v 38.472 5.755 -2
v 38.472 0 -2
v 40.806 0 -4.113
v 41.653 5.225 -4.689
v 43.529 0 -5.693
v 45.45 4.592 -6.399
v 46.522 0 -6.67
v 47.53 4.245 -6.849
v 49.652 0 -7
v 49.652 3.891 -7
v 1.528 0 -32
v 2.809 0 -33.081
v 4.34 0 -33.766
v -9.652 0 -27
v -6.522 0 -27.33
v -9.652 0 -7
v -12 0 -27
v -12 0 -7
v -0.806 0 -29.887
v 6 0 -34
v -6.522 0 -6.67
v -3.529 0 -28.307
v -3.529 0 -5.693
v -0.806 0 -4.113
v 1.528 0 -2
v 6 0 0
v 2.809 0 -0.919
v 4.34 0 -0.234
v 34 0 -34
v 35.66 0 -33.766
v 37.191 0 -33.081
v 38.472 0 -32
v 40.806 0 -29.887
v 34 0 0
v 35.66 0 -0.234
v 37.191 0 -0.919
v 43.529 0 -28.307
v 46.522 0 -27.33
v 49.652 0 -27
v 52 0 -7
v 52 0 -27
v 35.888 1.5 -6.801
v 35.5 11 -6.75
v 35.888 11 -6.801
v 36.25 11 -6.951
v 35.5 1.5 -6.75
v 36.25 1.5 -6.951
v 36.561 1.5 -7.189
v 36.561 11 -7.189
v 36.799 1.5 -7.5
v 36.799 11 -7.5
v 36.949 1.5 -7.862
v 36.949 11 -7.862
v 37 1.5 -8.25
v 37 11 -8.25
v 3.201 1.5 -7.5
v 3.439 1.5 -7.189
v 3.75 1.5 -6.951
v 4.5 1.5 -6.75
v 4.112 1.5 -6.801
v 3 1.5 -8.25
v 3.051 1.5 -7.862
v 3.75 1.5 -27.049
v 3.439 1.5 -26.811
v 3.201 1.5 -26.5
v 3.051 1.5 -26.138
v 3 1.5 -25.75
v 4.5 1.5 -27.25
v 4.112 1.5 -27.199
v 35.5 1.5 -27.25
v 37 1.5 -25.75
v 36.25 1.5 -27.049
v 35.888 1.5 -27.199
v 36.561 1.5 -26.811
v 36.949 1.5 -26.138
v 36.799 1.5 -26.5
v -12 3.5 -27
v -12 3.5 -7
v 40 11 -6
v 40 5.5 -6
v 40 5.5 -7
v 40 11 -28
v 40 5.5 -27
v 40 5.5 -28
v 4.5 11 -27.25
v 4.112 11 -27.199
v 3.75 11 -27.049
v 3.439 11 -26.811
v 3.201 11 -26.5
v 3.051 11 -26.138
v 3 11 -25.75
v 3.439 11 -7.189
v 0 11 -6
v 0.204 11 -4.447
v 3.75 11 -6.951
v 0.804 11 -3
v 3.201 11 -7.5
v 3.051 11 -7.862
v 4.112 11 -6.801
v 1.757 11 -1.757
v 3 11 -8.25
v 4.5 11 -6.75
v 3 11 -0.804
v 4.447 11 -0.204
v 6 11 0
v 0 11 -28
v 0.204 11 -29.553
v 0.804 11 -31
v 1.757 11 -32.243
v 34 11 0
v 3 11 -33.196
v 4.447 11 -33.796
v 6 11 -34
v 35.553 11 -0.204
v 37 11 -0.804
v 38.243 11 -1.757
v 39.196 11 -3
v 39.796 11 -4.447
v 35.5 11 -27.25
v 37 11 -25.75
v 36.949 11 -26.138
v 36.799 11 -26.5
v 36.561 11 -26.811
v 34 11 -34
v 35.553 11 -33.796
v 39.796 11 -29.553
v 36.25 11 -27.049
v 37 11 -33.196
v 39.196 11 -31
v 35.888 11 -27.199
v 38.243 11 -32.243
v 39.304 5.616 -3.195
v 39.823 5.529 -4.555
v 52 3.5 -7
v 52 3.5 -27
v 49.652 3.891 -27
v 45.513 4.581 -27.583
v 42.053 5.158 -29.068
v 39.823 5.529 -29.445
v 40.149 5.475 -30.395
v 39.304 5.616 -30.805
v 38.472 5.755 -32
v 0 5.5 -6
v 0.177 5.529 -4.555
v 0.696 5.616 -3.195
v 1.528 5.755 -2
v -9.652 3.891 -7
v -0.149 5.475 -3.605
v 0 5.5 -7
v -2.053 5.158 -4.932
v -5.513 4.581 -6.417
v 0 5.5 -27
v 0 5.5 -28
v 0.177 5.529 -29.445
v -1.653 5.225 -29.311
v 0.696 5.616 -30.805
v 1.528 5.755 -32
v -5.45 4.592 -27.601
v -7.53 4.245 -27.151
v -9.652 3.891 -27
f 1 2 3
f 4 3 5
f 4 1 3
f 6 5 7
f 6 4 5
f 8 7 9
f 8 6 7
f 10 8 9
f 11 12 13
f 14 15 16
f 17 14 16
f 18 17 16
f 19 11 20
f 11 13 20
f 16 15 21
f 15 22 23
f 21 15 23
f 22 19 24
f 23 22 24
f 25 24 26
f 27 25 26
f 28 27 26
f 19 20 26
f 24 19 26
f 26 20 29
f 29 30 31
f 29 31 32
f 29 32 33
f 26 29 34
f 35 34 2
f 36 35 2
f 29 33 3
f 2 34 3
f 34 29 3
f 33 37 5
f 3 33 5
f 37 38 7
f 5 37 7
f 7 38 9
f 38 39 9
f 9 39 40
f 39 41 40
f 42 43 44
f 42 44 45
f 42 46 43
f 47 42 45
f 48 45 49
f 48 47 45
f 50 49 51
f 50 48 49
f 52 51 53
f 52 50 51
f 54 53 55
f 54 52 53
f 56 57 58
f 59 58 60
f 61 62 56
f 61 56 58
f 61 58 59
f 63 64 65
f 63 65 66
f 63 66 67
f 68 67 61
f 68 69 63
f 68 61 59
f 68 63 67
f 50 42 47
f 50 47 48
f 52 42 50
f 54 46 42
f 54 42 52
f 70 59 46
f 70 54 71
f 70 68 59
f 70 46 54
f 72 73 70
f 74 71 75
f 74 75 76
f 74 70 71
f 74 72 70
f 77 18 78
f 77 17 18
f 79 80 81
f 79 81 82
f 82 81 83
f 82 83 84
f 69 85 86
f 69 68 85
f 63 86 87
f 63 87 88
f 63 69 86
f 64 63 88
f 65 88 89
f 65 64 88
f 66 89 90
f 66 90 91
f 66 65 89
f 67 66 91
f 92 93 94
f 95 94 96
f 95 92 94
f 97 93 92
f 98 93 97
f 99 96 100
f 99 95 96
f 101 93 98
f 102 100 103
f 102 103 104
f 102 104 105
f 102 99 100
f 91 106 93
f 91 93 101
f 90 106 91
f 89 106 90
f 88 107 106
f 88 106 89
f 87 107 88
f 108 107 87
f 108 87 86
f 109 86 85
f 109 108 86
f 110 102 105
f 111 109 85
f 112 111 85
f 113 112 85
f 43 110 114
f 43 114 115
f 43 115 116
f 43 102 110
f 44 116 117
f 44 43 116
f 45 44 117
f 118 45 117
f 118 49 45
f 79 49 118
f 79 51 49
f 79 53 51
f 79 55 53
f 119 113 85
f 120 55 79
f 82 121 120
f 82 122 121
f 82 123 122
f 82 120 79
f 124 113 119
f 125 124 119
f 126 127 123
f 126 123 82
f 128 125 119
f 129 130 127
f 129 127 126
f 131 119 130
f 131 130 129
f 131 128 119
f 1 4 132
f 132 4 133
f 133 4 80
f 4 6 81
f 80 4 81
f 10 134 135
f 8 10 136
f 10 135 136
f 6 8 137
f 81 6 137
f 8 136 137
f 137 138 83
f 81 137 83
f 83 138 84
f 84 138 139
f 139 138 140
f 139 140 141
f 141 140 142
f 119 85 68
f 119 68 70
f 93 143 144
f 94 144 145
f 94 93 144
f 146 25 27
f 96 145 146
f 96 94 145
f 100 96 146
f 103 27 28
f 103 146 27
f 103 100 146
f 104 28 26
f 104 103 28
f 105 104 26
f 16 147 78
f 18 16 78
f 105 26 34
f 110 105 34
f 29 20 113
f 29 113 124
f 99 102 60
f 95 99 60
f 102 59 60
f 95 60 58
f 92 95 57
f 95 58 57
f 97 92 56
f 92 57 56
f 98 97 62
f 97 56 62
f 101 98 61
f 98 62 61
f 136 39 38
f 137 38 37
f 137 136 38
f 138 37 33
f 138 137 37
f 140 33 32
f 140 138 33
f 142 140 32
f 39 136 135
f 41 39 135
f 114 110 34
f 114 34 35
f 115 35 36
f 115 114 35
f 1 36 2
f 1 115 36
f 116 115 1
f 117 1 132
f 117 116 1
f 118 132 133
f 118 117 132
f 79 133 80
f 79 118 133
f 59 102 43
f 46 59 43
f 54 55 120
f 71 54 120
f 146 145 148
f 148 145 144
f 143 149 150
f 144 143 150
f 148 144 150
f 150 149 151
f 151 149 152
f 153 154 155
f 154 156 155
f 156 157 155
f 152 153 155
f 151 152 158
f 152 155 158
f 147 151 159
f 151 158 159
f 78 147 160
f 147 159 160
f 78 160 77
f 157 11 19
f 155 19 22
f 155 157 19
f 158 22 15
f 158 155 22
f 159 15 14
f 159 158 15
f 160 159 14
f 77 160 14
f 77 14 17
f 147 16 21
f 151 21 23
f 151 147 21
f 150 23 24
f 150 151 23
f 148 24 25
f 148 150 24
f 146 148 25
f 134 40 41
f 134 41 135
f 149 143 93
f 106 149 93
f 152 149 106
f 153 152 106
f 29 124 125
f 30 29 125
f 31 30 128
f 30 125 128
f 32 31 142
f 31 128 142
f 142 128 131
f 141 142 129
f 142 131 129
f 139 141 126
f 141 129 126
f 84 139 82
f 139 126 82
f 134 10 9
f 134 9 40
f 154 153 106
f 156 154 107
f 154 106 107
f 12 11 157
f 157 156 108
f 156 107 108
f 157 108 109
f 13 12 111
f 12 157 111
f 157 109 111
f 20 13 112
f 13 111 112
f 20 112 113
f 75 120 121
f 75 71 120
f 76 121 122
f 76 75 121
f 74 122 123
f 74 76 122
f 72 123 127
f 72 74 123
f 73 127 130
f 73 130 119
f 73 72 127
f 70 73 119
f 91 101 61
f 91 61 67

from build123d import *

# Parameters (mm, degrees)
SKETCH1_W           = 40
SKETCH1_H           = 34
BOSS_EXTRUDE1_DEPTH = 11
SKETCH3_W           = 34
SKETCH3_H           = 20.5
CUT_EXTRUDE1_DEPTH  = 9.5
FILLET2_R           = 1.5
BOSS_EXTRUDE3_DEPTH = 10
FILLET3_R           = 6
FILLET4_R           = 15


with BuildPart() as part:
    # Sketch1 → Boss-Extrude1 (new body)
    with BuildSketch(Plane(origin=(0, 0, 0), x_dir=(1, 0, 0), z_dir=(0, 1, 0))):
        with Locations((20, 17)):
            Rectangle(SKETCH1_W, SKETCH1_H)
    extrude(amount=BOSS_EXTRUDE1_DEPTH)

    # Sketch3 → Cut-Extrude1 (cut)
    with BuildSketch(Plane(origin=(0, 11, 0), x_dir=(1, 0, 0), z_dir=(0, 1, 0))):
        with Locations((20, 17)):
            Rectangle(SKETCH3_W, SKETCH3_H)
    extrude(amount=-CUT_EXTRUDE1_DEPTH, mode=Mode.SUBTRACT)

    # Fillet2
    fillet2_edges = [part.edges().sort_by_distance(p)[0] for p in [
        (3, 6.25, -27.25),
        (3, 6.25, -6.75),
        (37, 6.25, -6.75),
        (37, 6.25, -27.25),
    ]]
    fillet(fillet2_edges, radius=FILLET2_R)

    # Sketch5 → Boss-Extrude3 (add, symmetric)
    with BuildSketch(Plane(origin=(0, 0, -17), x_dir=(-1, 0, 0), z_dir=(0, 0, -1))):
        Polygon((-40, 0), (-52, 0), (-52, 3.5), (-40, 5.5), align=None)
        Polygon((12, 3.5), (0, 5.5), (0, 0), (12, 0), align=None)
    extrude(amount=BOSS_EXTRUDE3_DEPTH, both=True)

    # Fillet3
    fillet3_edges = [part.edges().sort_by_distance(p)[0] for p in [
        (0, 5.5, -34),
        (40, 5.5, -34),
        (40, 5.5, 0),
        (0, 5.5, 0),
    ]]
    fillet(fillet3_edges, radius=FILLET3_R)

    # Fillet4
    # the kernel refuses this fillet: 15 mm, written as the material it adds along each edge
    with BuildSketch(Plane(origin=(0, 29.631189606, -27), x_dir=(0.2922336268554167, 0, -0.9563469597039189), z_dir=(0, -1, 0))) as fillet4_piece_1_section:
        with BuildLine():
            CenterArc((11.524426372, -13.614620328), FILLET4_R, 114.818587472, 48.189685104)
            Line((-2.820778024, -9.231115926), (-4.255298463, -8.792765485))
            Line((-4.255298463, -8.792765485), (-1.43452044, 0.43835044))
            Line((-1.43452044, 0.43835044), (0.43835044, 1.43452044))
            ThreePointArc((0.43835044, 1.43452044), (1.3946974, 1.142286813), (4.598608218, 1.361462033))
            Line((4.598608218, 1.361462033), (5.22822805, 0))
        make_face()
    fillet4_piece_1 = extrude(amount=29.631189606, mode=Mode.PRIVATE)
    fillet4_piece_1 = split(fillet4_piece_1, bisect_by=Plane(origin=(-2.592829237, 5.067861794, -27.668863599), z_dir=(0.16439898730535746, -0.9863939238321437, 0)), keep=Keep.TOP, mode=Mode.PRIVATE)
    add(fillet4_piece_1)
    with BuildSketch(Plane(origin=(0, 29.631189606, -7), x_dir=(0.2922336268554167, 0, 0.9563469597039189), z_dir=(0, -1, 0))) as fillet4_piece_2_section:
        with BuildLine():
            CenterArc((11.524426372, 13.614620328), FILLET4_R, 196.991727423, 48.189685104)
            Line((-2.820778024, 9.231115926), (-4.255298463, 8.792765485))
            Line((-4.255298463, 8.792765485), (-1.43452044, -0.43835044))
            Line((-1.43452044, -0.43835044), (0.43835044, -1.43452044))
            ThreePointArc((0.43835044, -1.43452044), (1.3946974, -1.142286813), (4.598608218, -1.361462033))
            Line((4.598608218, -1.361462033), (5.22822805, 0))
        make_face()
    fillet4_piece_2 = extrude(amount=29.631189606, mode=Mode.PRIVATE)
    fillet4_piece_2 = split(fillet4_piece_2, bisect_by=Plane(origin=(-2.592829237, 5.067861794, -6.331136401), z_dir=(0.16439898730535746, -0.9863939238321437, 0)), keep=Keep.TOP, mode=Mode.PRIVATE)
    add(fillet4_piece_2)
    with BuildSketch(Plane(origin=(40, 29.631189606, -7), x_dir=(-0.29223362685541665, 0, 0.9563469597039189), z_dir=(0, -1, 0))) as fillet4_piece_3_section:
        with BuildLine():
            CenterArc((11.524426372, -13.614620328), FILLET4_R, 114.818587472, 48.189685104)
            Line((-2.820778024, -9.231115926), (-4.255298463, -8.792765485))
            Line((-4.255298463, -8.792765485), (-1.43452044, 0.43835044))
            Line((-1.43452044, 0.43835044), (0.43835044, 1.43452044))
            ThreePointArc((0.43835044, 1.43452044), (1.3946974, 1.142286813), (4.598608218, 1.361462033))
            Line((4.598608218, 1.361462033), (5.22822805, 0))
        make_face()
    fillet4_piece_3 = extrude(amount=29.631189606, mode=Mode.PRIVATE)
    fillet4_piece_3 = split(fillet4_piece_3, bisect_by=Plane(origin=(42.592829237, 5.067861794, -6.331136401), z_dir=(-0.16439898730535732, -0.9863939238321437, 0)), keep=Keep.TOP, mode=Mode.PRIVATE)
    add(fillet4_piece_3)
    with BuildSketch(Plane(origin=(40, 29.631189606, -27), x_dir=(-0.2922336268554167, 0, -0.9563469597039189), z_dir=(0, -1, 0))) as fillet4_piece_4_section:
        with BuildLine():
            CenterArc((11.524426372, 13.614620328), FILLET4_R, 196.991727423, 48.189685104)
            Line((-2.820778024, 9.231115926), (-4.255298463, 8.792765485))
            Line((-4.255298463, 8.792765485), (-1.43452044, -0.43835044))
            Line((-1.43452044, -0.43835044), (0.43835044, -1.43452044))
            ThreePointArc((0.43835044, -1.43452044), (1.3946974, -1.142286813), (4.598608218, -1.361462033))
            Line((4.598608218, -1.361462033), (5.22822805, 0))
        make_face()
    fillet4_piece_4 = extrude(amount=29.631189606, mode=Mode.PRIVATE)
    fillet4_piece_4 = split(fillet4_piece_4, bisect_by=Plane(origin=(42.592829237, 5.067861794, -27.668863599), z_dir=(-0.16439898730535732, -0.9863939238321437, 0)), keep=Keep.TOP, mode=Mode.PRIVATE)
    add(fillet4_piece_4)


solid = part.part
